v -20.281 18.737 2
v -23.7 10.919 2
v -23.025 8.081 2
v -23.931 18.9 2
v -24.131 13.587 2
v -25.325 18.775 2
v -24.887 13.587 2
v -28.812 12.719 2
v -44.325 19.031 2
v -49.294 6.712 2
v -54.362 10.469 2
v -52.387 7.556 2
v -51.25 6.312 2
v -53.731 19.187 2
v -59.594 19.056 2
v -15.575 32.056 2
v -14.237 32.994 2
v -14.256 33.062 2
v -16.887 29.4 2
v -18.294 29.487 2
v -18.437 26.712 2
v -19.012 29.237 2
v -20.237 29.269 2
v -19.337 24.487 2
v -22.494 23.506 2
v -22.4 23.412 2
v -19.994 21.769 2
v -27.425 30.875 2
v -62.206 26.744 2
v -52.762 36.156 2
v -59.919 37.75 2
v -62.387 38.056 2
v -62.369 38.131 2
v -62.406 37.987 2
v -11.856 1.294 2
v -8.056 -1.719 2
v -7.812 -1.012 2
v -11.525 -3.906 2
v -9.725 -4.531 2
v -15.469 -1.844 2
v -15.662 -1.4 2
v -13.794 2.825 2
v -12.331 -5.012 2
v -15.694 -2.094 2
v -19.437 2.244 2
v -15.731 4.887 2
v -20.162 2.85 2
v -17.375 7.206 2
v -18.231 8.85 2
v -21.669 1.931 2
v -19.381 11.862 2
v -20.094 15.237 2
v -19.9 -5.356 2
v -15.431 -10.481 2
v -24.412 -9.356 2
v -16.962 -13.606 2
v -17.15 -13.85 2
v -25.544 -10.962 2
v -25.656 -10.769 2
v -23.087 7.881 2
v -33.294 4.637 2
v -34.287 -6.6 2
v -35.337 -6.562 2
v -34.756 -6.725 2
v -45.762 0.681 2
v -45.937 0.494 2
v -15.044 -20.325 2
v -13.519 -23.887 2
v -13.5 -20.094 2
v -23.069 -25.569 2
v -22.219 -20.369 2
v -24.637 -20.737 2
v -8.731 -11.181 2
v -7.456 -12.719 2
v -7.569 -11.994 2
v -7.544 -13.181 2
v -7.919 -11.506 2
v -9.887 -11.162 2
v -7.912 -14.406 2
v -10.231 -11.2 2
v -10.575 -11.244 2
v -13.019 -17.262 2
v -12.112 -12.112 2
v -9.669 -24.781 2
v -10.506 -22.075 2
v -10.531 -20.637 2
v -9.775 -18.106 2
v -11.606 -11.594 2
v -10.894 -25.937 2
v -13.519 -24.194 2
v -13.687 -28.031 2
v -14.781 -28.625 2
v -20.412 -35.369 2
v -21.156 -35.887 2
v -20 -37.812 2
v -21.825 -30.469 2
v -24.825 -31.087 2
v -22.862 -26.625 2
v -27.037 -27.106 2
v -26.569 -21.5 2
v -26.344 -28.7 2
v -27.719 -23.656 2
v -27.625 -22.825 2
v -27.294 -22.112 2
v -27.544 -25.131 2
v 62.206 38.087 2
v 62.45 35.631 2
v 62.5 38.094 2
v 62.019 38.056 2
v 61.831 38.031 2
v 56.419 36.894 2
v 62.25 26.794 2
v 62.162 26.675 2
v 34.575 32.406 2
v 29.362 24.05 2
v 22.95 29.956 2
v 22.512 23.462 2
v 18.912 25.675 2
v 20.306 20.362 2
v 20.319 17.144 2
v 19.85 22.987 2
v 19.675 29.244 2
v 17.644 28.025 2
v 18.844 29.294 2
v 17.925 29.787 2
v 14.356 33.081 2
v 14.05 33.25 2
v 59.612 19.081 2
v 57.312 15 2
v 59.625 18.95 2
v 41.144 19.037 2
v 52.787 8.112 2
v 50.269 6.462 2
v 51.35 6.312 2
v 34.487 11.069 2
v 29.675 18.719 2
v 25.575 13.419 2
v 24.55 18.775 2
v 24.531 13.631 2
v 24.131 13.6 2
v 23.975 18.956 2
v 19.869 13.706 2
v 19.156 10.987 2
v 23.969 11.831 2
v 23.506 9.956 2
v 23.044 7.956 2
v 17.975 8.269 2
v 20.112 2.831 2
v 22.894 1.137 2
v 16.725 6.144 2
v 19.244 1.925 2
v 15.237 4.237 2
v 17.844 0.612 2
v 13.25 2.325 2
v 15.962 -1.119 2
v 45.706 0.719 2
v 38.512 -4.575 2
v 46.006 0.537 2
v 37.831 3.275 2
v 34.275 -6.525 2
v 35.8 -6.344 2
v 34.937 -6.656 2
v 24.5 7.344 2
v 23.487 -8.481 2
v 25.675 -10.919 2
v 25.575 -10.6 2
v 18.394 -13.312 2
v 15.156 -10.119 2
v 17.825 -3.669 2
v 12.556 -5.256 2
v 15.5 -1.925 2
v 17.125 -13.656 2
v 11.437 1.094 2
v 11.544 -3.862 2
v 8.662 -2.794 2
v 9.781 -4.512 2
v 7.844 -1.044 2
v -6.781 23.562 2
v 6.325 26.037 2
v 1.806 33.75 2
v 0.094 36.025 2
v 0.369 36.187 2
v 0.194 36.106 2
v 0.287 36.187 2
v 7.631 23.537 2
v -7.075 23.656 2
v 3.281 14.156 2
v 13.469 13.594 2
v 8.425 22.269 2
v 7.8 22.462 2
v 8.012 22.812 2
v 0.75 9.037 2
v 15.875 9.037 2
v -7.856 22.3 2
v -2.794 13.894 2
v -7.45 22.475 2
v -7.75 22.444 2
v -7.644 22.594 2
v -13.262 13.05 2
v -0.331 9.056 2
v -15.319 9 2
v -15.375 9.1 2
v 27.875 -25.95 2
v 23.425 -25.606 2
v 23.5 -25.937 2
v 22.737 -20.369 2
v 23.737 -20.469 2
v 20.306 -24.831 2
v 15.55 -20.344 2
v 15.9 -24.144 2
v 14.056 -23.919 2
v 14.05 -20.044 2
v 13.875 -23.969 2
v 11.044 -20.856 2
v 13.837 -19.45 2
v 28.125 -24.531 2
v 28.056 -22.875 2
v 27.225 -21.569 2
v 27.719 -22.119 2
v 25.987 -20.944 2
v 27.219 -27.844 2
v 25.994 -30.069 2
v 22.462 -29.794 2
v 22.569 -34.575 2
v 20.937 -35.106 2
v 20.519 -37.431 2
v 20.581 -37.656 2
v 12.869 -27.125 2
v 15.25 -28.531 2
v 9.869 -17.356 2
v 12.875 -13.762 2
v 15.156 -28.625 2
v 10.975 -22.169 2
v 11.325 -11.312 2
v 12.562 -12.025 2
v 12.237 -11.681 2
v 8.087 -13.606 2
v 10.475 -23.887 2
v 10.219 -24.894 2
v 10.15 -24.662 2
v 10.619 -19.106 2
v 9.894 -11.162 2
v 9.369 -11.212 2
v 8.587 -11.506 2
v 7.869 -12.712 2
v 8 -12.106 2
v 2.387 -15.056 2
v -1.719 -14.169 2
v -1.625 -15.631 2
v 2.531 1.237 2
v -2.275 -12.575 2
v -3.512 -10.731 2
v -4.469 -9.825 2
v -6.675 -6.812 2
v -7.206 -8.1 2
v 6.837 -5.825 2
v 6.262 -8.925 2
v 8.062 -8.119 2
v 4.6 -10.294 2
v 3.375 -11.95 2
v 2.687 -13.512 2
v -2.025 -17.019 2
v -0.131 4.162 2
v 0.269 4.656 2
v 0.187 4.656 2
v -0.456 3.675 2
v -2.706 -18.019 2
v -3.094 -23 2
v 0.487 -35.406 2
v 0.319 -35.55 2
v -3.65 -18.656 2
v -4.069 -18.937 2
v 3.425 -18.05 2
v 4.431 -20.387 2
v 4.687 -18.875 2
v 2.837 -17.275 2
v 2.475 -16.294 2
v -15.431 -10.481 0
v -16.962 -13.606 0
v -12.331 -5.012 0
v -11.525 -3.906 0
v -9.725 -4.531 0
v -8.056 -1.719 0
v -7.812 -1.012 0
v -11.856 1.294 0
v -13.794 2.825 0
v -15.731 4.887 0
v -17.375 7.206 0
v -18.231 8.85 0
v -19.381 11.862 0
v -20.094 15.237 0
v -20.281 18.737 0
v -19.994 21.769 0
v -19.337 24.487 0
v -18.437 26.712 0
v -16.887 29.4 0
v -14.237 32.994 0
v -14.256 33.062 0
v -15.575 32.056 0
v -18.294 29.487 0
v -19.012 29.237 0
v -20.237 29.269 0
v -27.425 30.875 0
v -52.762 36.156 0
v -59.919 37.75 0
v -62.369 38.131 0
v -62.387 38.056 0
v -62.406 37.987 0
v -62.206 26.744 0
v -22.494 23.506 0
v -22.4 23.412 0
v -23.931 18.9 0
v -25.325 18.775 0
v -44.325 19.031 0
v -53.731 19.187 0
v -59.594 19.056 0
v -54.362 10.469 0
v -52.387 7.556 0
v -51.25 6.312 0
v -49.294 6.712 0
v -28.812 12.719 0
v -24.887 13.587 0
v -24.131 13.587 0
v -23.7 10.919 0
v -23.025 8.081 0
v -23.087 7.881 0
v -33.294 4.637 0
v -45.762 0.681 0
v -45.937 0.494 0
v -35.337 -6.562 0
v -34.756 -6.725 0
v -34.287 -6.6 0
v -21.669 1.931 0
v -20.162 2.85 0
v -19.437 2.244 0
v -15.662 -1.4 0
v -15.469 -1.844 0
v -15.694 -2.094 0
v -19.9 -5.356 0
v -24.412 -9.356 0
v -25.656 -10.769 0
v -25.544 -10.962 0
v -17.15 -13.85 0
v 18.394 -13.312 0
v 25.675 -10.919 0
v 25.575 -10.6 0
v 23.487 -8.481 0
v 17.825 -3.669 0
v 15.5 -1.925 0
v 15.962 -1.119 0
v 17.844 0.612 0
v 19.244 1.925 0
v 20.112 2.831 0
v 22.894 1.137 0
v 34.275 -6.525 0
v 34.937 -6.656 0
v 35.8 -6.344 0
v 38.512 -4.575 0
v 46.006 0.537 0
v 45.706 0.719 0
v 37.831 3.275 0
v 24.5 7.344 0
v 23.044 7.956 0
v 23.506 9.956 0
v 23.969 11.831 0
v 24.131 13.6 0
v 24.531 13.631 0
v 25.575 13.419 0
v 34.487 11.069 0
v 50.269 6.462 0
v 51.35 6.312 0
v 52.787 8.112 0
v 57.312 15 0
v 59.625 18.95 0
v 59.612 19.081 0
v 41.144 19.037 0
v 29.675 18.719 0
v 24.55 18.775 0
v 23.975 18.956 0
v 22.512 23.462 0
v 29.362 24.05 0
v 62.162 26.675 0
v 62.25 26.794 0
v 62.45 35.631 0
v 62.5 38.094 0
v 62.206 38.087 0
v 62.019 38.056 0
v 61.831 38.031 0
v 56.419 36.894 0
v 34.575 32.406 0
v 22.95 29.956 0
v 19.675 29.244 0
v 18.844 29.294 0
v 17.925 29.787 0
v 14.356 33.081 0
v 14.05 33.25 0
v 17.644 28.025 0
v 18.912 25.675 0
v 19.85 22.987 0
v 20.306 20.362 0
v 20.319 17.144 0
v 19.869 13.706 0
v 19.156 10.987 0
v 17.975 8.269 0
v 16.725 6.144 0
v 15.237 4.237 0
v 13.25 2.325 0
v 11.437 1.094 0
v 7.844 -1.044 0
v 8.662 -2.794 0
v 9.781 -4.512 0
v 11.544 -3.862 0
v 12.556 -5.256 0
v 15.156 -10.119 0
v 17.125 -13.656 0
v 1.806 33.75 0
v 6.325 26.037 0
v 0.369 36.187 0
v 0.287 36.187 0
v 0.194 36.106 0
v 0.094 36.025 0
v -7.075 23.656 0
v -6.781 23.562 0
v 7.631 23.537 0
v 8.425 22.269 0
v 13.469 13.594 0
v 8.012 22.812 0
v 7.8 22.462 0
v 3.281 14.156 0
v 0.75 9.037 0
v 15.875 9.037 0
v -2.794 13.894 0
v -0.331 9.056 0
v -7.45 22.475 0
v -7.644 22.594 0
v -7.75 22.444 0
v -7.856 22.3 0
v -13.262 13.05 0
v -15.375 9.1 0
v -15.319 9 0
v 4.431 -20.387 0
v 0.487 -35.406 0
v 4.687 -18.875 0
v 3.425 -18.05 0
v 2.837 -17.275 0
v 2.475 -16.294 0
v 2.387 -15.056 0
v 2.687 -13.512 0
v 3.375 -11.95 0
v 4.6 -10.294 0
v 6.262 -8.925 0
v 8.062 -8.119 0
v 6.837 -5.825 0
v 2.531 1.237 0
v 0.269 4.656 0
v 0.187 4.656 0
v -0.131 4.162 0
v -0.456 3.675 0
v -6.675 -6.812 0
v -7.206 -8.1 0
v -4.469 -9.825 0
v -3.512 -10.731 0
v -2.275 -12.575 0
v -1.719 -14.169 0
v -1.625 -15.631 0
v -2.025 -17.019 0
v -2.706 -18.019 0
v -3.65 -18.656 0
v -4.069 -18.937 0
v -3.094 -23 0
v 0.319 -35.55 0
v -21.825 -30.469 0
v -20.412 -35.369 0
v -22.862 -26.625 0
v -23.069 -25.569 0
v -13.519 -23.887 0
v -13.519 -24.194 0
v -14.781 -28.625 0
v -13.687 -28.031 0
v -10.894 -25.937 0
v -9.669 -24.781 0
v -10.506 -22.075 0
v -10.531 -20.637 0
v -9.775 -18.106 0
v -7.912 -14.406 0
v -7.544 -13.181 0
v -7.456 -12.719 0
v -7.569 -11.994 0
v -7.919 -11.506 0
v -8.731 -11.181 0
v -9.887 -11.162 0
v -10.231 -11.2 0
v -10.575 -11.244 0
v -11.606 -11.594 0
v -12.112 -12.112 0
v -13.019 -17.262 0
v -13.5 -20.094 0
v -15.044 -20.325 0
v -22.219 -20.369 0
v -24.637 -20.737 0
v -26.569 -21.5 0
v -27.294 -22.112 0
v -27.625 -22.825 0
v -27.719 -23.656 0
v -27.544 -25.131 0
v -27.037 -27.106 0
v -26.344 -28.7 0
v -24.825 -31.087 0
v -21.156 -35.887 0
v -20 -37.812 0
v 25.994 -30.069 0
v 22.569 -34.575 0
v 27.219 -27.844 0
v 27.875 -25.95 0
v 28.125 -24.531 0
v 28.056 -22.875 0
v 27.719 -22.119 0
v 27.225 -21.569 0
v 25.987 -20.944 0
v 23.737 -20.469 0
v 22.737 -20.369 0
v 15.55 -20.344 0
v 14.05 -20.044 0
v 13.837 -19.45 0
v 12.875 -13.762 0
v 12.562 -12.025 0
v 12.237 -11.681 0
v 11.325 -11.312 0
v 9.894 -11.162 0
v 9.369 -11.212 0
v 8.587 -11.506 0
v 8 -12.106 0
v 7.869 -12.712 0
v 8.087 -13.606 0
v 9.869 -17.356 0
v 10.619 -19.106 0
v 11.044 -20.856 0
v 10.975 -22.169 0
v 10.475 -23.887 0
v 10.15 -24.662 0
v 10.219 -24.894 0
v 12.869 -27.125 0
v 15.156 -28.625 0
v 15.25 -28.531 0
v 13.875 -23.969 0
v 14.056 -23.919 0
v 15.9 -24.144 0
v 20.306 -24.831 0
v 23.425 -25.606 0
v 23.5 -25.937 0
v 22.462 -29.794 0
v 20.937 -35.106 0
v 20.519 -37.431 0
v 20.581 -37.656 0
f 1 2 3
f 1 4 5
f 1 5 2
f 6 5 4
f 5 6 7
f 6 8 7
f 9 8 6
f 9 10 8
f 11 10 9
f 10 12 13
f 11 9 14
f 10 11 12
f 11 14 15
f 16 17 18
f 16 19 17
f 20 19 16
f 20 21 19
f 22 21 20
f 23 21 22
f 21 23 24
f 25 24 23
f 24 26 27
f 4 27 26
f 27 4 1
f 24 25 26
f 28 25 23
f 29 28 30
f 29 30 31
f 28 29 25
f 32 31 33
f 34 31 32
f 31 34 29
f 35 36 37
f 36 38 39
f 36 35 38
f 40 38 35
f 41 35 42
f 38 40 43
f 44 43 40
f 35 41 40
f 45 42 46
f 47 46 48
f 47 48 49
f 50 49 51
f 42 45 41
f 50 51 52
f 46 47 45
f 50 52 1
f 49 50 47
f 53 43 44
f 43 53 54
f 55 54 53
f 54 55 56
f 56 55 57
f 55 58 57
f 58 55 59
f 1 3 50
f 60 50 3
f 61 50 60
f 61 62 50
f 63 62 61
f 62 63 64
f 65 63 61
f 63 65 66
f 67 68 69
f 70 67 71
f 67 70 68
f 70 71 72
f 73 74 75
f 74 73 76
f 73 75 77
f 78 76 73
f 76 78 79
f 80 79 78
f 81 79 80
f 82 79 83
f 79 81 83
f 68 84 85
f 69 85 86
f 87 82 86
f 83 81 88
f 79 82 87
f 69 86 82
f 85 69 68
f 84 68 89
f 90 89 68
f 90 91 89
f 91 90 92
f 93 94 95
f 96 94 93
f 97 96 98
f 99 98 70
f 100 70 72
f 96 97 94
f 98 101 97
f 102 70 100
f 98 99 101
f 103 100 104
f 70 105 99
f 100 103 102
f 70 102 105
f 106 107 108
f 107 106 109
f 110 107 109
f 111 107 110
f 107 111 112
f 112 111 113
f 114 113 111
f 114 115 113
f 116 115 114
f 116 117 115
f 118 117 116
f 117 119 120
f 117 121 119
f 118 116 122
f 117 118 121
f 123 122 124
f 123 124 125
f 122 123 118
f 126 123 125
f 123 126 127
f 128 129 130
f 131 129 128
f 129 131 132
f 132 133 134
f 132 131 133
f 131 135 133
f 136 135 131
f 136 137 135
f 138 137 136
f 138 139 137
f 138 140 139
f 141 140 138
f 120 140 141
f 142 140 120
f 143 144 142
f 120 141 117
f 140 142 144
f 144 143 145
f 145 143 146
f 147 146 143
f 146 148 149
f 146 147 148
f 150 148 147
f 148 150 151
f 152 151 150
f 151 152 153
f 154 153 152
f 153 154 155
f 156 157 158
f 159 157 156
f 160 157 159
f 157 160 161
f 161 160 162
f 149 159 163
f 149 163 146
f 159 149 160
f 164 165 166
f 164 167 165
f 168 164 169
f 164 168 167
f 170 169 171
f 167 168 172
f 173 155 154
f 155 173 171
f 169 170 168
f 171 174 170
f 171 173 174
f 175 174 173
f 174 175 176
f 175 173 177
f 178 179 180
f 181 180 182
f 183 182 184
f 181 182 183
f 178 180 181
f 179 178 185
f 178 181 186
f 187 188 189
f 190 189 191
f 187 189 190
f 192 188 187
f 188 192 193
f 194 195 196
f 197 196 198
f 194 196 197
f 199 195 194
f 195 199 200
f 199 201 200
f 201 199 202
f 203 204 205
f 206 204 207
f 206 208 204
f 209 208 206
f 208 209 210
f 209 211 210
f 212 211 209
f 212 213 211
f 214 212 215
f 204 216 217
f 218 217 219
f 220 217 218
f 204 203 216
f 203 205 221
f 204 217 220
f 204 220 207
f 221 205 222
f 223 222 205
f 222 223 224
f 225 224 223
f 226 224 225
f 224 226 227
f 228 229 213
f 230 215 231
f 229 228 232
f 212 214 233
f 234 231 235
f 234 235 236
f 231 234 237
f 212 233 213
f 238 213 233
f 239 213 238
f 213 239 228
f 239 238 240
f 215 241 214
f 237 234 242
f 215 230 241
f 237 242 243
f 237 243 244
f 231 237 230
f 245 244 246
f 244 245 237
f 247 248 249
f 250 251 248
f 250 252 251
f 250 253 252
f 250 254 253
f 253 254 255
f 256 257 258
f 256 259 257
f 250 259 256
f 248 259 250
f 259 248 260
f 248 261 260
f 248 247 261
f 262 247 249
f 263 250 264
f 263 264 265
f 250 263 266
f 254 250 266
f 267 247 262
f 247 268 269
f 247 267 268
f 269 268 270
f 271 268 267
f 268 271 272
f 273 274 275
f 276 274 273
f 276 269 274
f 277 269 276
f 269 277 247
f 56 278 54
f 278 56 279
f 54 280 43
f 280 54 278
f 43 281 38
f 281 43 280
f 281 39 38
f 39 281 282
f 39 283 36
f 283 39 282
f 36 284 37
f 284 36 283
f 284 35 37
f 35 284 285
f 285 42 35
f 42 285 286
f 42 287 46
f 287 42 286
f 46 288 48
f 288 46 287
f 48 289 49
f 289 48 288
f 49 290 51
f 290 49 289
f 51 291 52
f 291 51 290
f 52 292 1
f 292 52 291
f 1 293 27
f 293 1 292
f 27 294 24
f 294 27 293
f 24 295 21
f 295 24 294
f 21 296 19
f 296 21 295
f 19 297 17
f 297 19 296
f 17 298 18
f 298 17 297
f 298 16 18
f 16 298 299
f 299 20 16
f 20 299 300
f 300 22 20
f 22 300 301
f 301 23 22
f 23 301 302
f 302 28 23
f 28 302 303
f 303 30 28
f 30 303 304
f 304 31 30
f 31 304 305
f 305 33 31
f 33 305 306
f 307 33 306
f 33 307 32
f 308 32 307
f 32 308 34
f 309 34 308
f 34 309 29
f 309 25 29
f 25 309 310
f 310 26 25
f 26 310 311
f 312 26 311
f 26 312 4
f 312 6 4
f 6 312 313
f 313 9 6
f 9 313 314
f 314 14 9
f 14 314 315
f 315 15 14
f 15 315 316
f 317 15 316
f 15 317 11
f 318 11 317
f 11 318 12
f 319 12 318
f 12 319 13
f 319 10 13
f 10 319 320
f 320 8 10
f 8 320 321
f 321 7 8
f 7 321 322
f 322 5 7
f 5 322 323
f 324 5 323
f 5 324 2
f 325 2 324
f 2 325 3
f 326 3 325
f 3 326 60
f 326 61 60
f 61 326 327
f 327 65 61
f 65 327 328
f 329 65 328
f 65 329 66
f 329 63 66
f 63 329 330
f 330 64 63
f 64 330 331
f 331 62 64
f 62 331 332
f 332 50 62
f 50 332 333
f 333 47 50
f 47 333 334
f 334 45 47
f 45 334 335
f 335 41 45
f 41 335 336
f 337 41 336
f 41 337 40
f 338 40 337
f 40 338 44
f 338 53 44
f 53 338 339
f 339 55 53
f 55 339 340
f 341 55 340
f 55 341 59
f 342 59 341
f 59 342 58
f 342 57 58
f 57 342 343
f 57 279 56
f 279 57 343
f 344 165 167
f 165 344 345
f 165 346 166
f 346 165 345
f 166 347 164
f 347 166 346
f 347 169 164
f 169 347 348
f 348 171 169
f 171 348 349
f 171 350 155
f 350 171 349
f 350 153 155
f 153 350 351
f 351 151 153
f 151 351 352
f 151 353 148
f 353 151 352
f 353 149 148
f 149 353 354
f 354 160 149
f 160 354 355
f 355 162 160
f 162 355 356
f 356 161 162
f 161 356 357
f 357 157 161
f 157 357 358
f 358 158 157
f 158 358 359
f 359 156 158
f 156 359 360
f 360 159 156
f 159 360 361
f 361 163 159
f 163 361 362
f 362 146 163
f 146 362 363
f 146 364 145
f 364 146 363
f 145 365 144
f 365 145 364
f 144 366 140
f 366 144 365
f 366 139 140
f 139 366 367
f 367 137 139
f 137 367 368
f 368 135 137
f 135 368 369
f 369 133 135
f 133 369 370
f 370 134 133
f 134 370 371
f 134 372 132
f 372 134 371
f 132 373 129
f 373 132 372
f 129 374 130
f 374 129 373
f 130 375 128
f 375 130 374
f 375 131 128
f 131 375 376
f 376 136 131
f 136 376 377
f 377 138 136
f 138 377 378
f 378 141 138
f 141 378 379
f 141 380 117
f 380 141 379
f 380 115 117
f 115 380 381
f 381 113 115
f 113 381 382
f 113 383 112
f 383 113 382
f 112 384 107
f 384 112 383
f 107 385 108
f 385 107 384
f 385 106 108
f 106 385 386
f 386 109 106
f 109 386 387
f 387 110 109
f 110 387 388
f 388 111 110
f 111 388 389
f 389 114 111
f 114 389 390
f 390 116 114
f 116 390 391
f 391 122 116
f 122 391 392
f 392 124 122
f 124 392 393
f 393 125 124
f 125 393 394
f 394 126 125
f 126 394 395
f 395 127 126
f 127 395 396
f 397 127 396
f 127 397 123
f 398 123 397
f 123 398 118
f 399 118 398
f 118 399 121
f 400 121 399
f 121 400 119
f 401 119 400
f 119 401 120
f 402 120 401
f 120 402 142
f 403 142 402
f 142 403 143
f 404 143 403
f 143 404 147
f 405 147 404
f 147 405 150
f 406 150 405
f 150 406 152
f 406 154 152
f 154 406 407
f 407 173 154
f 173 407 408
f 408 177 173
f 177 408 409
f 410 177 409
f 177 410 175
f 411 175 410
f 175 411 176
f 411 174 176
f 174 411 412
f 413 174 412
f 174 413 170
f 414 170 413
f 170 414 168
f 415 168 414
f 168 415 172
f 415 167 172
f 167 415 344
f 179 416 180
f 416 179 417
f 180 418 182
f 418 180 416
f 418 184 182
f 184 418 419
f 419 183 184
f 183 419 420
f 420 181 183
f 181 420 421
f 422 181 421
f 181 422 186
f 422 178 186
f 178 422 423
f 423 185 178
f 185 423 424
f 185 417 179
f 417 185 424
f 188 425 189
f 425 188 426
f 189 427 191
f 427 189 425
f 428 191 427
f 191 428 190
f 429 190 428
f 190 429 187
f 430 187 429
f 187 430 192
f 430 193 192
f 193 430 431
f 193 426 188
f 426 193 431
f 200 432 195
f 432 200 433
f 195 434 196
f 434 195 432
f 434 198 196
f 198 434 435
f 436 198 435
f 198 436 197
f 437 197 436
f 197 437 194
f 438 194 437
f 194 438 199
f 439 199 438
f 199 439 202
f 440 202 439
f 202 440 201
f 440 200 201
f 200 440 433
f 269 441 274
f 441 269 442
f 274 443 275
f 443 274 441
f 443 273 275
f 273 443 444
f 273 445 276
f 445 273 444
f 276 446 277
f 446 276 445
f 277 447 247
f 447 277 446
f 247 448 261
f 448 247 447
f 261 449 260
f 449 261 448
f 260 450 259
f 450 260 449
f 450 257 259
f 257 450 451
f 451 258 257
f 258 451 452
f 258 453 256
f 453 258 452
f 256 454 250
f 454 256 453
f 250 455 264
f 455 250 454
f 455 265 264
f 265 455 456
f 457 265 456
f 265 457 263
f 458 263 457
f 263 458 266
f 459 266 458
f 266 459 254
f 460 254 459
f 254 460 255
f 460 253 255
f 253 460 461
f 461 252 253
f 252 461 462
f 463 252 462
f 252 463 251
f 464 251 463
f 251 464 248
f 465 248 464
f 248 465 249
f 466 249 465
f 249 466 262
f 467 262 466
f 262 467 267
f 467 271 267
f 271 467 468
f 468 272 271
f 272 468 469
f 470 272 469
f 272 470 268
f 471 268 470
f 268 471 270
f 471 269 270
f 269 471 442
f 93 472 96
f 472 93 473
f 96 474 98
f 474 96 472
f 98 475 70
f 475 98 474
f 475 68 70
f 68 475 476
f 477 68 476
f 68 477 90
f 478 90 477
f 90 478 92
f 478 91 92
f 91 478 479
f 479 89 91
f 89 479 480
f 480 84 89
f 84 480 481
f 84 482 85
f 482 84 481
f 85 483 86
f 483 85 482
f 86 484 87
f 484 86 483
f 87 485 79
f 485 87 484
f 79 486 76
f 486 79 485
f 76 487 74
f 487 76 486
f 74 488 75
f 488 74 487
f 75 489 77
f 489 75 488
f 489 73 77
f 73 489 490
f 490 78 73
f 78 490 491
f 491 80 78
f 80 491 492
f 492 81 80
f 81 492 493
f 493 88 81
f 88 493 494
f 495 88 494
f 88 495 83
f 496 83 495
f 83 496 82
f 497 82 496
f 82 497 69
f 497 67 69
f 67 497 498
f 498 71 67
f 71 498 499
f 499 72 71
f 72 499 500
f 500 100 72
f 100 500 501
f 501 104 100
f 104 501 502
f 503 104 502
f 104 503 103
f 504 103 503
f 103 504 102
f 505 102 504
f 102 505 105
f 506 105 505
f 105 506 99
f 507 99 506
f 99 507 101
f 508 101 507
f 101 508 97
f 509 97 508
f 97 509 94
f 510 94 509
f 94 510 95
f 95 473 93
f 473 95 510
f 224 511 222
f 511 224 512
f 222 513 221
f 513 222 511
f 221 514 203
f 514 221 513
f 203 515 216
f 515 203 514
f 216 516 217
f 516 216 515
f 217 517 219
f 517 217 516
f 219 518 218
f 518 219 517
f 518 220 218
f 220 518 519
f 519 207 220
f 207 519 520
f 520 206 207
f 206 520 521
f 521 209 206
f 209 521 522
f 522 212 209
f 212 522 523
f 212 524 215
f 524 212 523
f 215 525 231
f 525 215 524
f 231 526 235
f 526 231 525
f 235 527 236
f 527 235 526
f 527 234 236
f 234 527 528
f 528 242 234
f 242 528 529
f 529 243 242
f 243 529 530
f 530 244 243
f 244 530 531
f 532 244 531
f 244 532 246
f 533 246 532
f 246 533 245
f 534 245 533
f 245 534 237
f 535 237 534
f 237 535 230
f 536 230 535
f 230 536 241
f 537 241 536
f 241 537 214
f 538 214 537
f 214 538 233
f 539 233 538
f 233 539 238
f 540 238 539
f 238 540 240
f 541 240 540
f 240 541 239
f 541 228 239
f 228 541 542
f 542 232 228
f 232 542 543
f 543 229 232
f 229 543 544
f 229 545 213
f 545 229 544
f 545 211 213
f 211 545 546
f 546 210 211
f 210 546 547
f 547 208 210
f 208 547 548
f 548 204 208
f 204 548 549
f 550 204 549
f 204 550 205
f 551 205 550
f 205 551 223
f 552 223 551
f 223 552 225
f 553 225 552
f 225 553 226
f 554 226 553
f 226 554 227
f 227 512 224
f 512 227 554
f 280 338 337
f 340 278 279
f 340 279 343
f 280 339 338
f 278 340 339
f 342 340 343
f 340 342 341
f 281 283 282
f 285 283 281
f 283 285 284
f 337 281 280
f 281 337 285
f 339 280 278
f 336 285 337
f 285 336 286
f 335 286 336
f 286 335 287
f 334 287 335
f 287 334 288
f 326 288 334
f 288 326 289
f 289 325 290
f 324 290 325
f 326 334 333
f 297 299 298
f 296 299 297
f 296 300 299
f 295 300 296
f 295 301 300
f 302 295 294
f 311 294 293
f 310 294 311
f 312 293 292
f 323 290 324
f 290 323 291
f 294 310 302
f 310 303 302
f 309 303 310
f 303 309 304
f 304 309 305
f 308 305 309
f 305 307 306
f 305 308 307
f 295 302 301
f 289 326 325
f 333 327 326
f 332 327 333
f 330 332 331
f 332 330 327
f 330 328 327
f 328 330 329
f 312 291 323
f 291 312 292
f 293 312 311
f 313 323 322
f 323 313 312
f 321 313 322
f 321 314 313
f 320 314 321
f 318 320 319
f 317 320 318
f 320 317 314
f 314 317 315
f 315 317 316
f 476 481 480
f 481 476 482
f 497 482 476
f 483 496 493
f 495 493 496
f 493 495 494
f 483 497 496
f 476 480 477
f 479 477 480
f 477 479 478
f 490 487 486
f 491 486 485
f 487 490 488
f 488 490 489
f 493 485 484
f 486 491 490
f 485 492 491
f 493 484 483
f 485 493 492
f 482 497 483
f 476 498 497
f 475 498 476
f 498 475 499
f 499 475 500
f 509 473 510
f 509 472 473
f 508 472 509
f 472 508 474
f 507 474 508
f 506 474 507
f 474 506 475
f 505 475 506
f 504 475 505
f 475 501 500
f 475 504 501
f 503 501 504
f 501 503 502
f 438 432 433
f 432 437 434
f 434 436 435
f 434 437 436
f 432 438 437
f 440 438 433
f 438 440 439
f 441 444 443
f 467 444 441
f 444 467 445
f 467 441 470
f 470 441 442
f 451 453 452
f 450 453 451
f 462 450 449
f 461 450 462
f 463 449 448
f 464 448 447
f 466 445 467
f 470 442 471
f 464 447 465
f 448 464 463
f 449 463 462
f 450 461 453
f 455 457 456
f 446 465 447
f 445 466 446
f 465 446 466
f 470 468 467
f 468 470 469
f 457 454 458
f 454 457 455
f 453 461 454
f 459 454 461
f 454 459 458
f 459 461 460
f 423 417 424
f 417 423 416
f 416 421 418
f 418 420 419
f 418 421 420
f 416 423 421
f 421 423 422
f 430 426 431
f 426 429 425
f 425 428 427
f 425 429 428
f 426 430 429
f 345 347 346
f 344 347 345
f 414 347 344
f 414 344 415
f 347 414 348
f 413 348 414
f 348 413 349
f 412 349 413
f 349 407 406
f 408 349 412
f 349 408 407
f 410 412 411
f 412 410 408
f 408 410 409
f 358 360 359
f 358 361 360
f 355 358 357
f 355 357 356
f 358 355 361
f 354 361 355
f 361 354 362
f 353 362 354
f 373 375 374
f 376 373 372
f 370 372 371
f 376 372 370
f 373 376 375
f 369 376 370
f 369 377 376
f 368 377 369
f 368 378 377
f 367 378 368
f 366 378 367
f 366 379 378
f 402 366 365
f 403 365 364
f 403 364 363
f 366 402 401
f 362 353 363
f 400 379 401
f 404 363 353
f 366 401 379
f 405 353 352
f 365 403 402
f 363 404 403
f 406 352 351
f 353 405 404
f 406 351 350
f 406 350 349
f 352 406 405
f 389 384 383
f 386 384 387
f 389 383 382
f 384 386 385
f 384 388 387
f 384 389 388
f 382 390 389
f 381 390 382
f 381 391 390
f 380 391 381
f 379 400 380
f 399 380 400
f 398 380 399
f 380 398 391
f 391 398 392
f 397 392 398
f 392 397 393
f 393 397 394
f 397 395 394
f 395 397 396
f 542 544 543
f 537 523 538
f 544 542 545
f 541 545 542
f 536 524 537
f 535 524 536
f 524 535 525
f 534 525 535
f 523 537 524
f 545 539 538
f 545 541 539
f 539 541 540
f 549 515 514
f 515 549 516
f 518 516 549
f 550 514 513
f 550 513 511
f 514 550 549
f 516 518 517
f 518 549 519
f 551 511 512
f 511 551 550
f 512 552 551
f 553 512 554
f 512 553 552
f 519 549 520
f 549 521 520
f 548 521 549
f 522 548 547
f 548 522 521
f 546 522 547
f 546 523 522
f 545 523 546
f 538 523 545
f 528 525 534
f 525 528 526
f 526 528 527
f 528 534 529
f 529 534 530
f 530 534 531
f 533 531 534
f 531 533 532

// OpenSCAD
module 98d85459731806227d2d7fe25b8e41e4_1()
{
 /* Generated by trace2scad version 20150415
    http://aggregate.org/MAKE/TRACE2SCAD/
    Optimized model has 279/3846 original points
 */
 color([0.48, 0.48, 0.48])
 assign(minx=0) /* polygon minx=15 */
 assign(miny=0) /* polygon miny=75 */
 assign(maxx=20000) /* polygon maxx=20000 */
 assign(maxy=12250) /* polygon maxy=12226 */
 assign(dx=maxx-minx)
 assign(dy=maxy-miny)
 assign(maxd=((dx>dy)?dx:dy))
 scale([1/maxd, 1/maxd, 1])
 translate([-minx-dx/2, -miny-dy/2, 0])
 linear_extrude(height=1, convexity=279)
 union() {
  union() {
   polygon([[18,12214],[15,12203],[47,10404],[6401,9886],[6416,9871],[6171,9149],[5948,9129],[2908,9170],[1403,9195],[465,9174],[1302,7800],[1618,7334],[1800,7135],[2113,7199],[5390,8160],[6018,8299],[6139,8299],[6208,7872],[6316,7418],[6306,7386],[4673,6867],[2678,6234],[2650,6204],[4346,5075],[4439,5049],[4514,5069],[6533,6434],[6774,6581],[6890,6484],[7494,5901],[7525,5830],[7489,5790],[6816,5268],[6094,4628],[5895,4402],[5913,4371],[7256,3909],[7286,3948],[7531,4448],[8027,5323],[8156,5500],[8444,5400],[8711,5850],[8750,5963],[8103,6332],[7793,6577],[7483,6907],[7220,7278],[7083,7541],[6899,8023],[6785,8563],[6755,9123],[6801,9608],[6906,10043],[7050,10399],[7298,10829],[7722,11404],[7719,11415],[7508,11254],[7073,10843],[6958,10803],[6762,10808],[5612,11065],[1558,11910],[413,12165],[21,12226]], convexity=24);
   polygon([[19923,12214],[19893,12210],[19027,12028],[15532,11310],[13672,10918],[13148,10804],[13015,10812],[12868,10891],[12297,11418],[12248,11445],[12823,10609],[13026,10233],[13176,9803],[13249,9383],[13251,8868],[13179,8318],[13065,7883],[12876,7448],[12676,7108],[12438,6803],[12120,6497],[11830,6300],[11255,5958],[11386,5678],[11565,5403],[11847,5507],[12009,5284],[12425,4506],[12740,3940],[12943,3995],[14108,4378],[14092,4429],[13758,4768],[12852,5538],[12480,5817],[12554,5946],[12855,6223],[13079,6433],[13218,6578],[13663,6307],[15484,5081],[15590,5060],[15728,5110],[16162,5393],[17361,6211],[17313,6240],[16053,6649],[13920,7300],[13687,7398],[13761,7718],[13835,8018],[13861,8301],[13925,8306],[14092,8272],[15518,7896],[18043,7159],[18216,7135],[18446,7423],[19170,8525],[19540,9157],[19538,9178],[16583,9171],[14748,9120],[13928,9129],[13836,9158],[13602,9879],[14698,9973],[19946,10393],[19960,10412],[19992,11826],[20000,12220],[19953,12219]], convexity=23);
   polygon([[10031,11902],[10015,11889],[8868,9910],[8915,9895],[11221,9891],[11012,10291],[10289,11525],[10059,11915],[10046,11915]], convexity=5);
   polygon([[11265,9747],[11248,9719],[10525,8390],[10120,7571],[12540,7571],[12155,8300],[11348,9688],[11282,9775]], convexity=5);
   polygon([[8760,9716],[8743,9693],[7878,8213],[7540,7581],[7549,7565],[9947,7574],[9553,8348],[8808,9721],[8777,9740]], convexity=6);
   polygon([[9979,6791],[9927,6713],[8932,5035],[8847,4829],[9285,4553],[9438,4408],[9636,4113],[9725,3858],[9740,3624],[9676,3402],[9567,3242],[9416,3140],[9349,3095],[9505,2445],[10051,437],[10078,460],[10709,2863],[10750,3105],[10548,3237],[10454,3361],[10396,3518],[10382,3716],[10430,3963],[10540,4213],[10736,4478],[11002,4697],[11290,4826],[11094,5193],[10405,6323],[10043,6870],[10030,6870]], convexity=10);
   polygon([[8363,4333],[8308,4326],[8143,4270],[8062,4187],[7917,3363],[7840,2910],[7593,2873],[6445,2866],[6058,2807],[5749,2685],[5633,2587],[5580,2473],[5565,2340],[5593,2104],[5674,1788],[5785,1533],[6028,1151],[6615,383],[6800,75],[6734,466],[6508,1250],[6342,1865],[6309,2034],[7837,2303],[7837,2254],[7635,1545],[7810,1640],[8257,1975],[8453,2160],[8319,2593],[8315,2823],[8436,3228],[8734,3820],[8793,4016],[8807,4090],[8789,4206],[8733,4284],[8603,4336],[8418,4339]], convexity=12);
   polygon([[11541,4335],[11499,4331],[11374,4284],[11280,4188],[11259,4091],[11294,3948],[11579,3348],[11699,3068],[11767,2788],[11756,2578],[11676,2303],[11624,2179],[11635,2142],[12059,1785],[12425,1545],[12440,1560],[12220,2290],[12249,2298],[12544,2262],[13249,2152],[13748,2028],[13760,1975],[13594,1358],[13350,508],[13283,136],[13293,100],[13611,593],[14159,1314],[14355,1670],[14460,1973],[14500,2200],[14489,2465],[14435,2586],[14356,2674],[14158,2774],[13798,2850],[13638,2866],[12488,2870],[12248,2918],[12214,3013],[12060,3923],[12010,4201],[11958,4256],[11812,4315],[11583,4339]], convexity=14);
  }
 }
}

module 98d85459731806227d2d7fe25b8e41e4()
{
 /* all layers combined, scaled to within a 1mm cube */
 scale([1, 1, 1/1])
 difference() {
  union() {
   scale([1,1,2]) translate([0,0,-0.5]) 98d85459731806227d2d7fe25b8e41e4_1();
  }
  translate([0,0,-2]) cube([2,2,4],center=true);
 }
}

scale([125, 125, 2]) {
	98d85459731806227d2d7fe25b8e41e4();
}
